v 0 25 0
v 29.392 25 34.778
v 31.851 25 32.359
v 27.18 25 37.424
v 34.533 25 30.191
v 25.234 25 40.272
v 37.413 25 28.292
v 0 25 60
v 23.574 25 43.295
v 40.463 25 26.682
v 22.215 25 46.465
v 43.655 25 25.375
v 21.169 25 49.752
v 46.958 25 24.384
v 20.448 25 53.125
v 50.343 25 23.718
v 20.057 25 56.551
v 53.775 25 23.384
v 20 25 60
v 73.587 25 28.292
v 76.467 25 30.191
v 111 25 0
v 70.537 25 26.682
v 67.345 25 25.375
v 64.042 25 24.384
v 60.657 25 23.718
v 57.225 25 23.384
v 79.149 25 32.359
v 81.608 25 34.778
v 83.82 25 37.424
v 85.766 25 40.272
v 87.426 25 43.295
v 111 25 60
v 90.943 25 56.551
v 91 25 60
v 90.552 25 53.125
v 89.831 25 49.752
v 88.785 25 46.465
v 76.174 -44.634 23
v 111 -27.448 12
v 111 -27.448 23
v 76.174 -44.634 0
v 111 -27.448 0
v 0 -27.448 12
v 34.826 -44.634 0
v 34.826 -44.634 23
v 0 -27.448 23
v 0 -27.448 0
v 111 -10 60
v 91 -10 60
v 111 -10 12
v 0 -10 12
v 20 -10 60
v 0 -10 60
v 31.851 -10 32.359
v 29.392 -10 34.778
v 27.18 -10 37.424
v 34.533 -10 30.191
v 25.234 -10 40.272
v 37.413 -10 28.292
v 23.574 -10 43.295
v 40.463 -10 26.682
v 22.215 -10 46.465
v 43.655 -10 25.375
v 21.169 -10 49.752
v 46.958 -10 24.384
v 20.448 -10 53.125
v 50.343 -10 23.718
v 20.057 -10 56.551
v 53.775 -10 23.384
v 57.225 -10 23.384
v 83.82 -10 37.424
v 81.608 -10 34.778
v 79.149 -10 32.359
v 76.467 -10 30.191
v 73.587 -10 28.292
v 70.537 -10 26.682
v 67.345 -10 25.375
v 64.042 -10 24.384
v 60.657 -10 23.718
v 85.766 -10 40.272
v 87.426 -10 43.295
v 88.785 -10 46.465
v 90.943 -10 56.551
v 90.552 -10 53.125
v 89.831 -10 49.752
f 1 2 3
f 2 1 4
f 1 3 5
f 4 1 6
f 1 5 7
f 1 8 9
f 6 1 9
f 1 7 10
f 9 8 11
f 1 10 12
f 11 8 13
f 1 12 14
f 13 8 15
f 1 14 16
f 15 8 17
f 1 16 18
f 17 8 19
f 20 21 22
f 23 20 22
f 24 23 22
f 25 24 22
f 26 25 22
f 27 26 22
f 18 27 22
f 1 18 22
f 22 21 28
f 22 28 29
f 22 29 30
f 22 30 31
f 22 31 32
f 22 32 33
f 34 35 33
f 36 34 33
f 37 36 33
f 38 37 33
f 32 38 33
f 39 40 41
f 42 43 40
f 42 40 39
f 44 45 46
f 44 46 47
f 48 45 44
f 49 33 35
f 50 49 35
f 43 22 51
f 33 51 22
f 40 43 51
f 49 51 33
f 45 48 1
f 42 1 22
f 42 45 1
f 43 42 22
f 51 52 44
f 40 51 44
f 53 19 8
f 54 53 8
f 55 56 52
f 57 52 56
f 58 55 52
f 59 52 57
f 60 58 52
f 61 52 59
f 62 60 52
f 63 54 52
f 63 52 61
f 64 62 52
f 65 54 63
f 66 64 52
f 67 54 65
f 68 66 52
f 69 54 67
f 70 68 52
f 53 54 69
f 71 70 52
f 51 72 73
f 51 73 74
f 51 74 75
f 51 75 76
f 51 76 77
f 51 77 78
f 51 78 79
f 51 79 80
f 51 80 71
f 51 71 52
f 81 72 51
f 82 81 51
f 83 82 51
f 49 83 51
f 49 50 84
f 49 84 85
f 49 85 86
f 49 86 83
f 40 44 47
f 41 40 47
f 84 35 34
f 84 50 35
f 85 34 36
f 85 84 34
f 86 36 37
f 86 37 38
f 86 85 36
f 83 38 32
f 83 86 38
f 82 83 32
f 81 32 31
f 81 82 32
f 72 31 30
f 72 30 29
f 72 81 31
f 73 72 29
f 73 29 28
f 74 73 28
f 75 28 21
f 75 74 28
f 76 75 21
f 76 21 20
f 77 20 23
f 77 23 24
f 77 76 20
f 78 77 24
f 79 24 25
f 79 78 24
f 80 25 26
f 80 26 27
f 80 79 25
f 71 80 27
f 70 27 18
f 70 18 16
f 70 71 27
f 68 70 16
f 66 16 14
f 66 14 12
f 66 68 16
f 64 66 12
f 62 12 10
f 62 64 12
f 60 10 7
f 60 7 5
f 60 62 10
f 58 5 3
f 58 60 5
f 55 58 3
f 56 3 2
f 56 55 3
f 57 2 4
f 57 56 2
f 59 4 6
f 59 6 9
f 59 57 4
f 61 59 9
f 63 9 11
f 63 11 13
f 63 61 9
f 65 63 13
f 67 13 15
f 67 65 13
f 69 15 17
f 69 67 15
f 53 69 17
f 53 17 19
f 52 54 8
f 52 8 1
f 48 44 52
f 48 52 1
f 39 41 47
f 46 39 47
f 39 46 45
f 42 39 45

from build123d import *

# Parameters (mm, degrees)
F1_DEPTH      = 10
F1_DEPTH_BACK = 25
F3_DEPTH      = 111
F5_DEPTH      = 60.001


with BuildPart() as f1:
    # F0 (on Front) → F1 (new body, two sides)
    with BuildSketch(Plane.XZ) as f1_sk:
        with BuildLine():
            Line((0, 60), (0, 0))
            Line((0, 0), (111, 0))
            Line((111, 0), (111, 60))
            Line((111, 60), (91, 60))
            ThreePointArc((91, 60), (55.5, 23.341768), (20, 60))
            Line((20, 60), (0, 60))
        make_face()
    extrude(amount=F1_DEPTH)
    extrude(f1_sk.sketch, amount=-F1_DEPTH_BACK)

    # F2 (on Right) → F3 (join)
    with BuildSketch(Plane.YZ):
        Polygon((0, 12), (-10.259873, 12), (-27.44799, 12), (-27.44799, 23), (-44.633665, 23), (-44.633665, 0), (-27.168316, 0), (0, 0), align=None)
    extrude(amount=F3_DEPTH)

    # F4 (on Top) → F5 (cut, through all)
    with BuildSketch(Plane.XY):
        Polygon((111, -27.44799), (76.174157, -44.633665), (111, -44.633665), align=None)
        Polygon((34.825843, -44.633665), (0, -27.44799), (0, -44.633665), align=None)
    extrude(amount=F5_DEPTH, mode=Mode.SUBTRACT)


solid = f1.part
